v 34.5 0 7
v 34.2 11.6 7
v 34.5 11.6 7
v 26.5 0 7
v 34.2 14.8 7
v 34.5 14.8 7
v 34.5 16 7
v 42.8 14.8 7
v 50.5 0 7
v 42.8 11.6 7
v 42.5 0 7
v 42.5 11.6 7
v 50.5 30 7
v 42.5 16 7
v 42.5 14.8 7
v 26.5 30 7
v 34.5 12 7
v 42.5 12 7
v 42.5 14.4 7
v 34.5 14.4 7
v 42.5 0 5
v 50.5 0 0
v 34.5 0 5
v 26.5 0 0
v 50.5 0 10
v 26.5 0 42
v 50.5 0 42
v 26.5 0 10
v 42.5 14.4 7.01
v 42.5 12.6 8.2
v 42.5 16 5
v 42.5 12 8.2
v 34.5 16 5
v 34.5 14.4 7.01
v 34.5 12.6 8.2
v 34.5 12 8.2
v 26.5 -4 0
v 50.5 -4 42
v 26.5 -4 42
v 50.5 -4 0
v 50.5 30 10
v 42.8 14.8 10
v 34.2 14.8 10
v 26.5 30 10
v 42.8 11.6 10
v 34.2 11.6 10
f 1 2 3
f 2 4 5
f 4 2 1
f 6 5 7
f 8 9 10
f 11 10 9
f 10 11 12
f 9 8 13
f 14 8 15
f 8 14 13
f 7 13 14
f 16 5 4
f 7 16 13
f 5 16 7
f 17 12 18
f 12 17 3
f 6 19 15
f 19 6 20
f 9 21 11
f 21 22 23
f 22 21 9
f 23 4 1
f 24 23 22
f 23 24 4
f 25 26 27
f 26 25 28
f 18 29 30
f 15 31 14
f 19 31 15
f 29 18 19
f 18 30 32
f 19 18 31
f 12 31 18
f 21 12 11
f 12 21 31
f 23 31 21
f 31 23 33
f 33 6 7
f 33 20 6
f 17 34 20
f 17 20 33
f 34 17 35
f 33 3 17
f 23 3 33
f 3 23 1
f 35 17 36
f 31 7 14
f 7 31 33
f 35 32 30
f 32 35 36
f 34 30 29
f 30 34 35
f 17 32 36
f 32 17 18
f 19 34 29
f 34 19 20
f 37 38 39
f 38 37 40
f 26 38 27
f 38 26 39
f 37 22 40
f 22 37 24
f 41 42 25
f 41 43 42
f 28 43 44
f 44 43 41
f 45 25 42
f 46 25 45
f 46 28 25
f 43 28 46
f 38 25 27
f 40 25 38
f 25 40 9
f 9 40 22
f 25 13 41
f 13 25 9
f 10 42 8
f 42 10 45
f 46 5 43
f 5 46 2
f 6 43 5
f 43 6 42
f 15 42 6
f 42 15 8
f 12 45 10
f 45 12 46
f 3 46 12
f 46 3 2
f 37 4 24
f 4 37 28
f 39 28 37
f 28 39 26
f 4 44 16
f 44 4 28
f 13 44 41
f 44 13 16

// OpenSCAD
// Lab Rax generic equipment tray + faceplate (wizard template).
// Faceplate derived from the Pi4 baseline; rack holes follow the four-corner layout of the user-supplied
// 1U blank plate (faceplate_mounting.json): EVERY rack unit gets 4 holes, never a single centre pair.
// The wizard appends override assignments at the end of this file.
// PROPOSED, UNVALIDATED: printed fit, strength and rack clearance are UNKNOWN.
$fn=48;
part="assembly";            // assembly, faceplate, tray, combined, rear_bracket
// Device envelope (mm). Origin of hole coordinates = device front-left corner, seen from above.
dev_w=85; dev_d=56; dev_h=20;
holes=[];                   // [[x,y],...] mounting hole centres
hole_d=2.7;                 // device mounting hole diameter
device_mount="inserts";     // inserts, pegs, clips, straps
standoff=6;                 // device lift above tray floor
insert_pilot=3.2;           // pilot for heat-set insert (inserts mode)
board_t=1.6;                // board/flange thickness (pegs, clips)
joint="screw";              // screw, snap, single
u=1;                        // faceplate height in rack units
keystones=[];               // [x,...] keystone centres on faceplate (X=0 centre)
// Keystone v2 (2026-10-19): re-modelled from measurements of Brian's reference keystone frame
// (14.5 x 16 opening was too narrow when printed). Opening 14.8 x 16.6 through the plate, plus a rear collar
// 19.8 x 27.85 reaching 9.2 mm behind the front face (bottom lip to 10.4) that carries the latch ramp and catches.
ks_w=14.8; ks_h=16.6;       // front opening
ks_ow=19.8; ks_ob=11.9; ks_ot=15.95; ks_od=9.2; ks_lip=10.4;  // collar width, below/above opening centre, depth
ports=[];                   // [[x,z,w,h,r],...] faceplate cut-outs, z from plate bottom, r=corner radius
front_gap=12;               // device front to faceplate rear face
margin=8;                   // tray border around device
rear_support=false;         // heavy/deep equipment: tray runs to the rear posts and screws to a rear bracket
coupon=[];                  // test coupon: [x0,x1,ymax] keeps only that slice of the part

// 4 mm plate (owner default 2026-10-18). Corner radius is limited by the four-corner holes:
// the reference holes sit 1.6 mm from the top/bottom edge, so larger corners would cut into them.
plate_w=252; plate_t=4; plate_r=2.5; plate_h=u*44.45-2.45;
hole_x=118.2625; hole_dz=15.902;   // each U: holes at its centre ±hole_dz (5.098 / 36.902 on a 1U plate)
rack_depth=240;             // Lab Rax frame depth (front of front posts to back of rear posts)
nudge=0;                    // render-repair only: tiny size offset applied when OpenSCAD 2021 emits a sliver
tray_t=3; tray_z=7;
tray_w=dev_w+2*margin; tray_d=rear_support?rack_depth:dev_d+front_gap+margin;
tray_x=-tray_w/2; tray_y=0;
dev_x=-dev_w/2; dev_y=front_gap; floor_top=tray_z+tray_t;
jx=min(40,tray_w/2-12); joint_x=[-jx,jx];
tongue_w=12; tongue_depth=7; tongue_h=3; tongue_z=tray_z+3.5;
slot_clear=0.3; boss_d=9; m3_clear=3.4; joint_pilot=4.0;  // 4.0 = the printed, well-fitting Pi4 trial

module capsule2d(len=10,diam=7){hull(){translate([-(len-diam)/2,0])circle(d=diam);translate([(len-diam)/2,0])circle(d=diam);}}
module rrect(w,h,r){rr=min(r,w/2-0.01,h/2-0.01);if(rr<=0)square([w,h],center=true);else offset(r=rr)square([w-2*rr,h-2*rr],center=true);}
// Mirror front-of-tray features to the rear (about the rack's mid-depth).
module to_rear(){translate([0,rack_depth/2,0])mirror([0,1,0])translate([0,-rack_depth/2,0])children();}

// Faceplate outline seen from the front: 2D X = rack X, 2D Y = height Z.
// rear=true cuts the larger keystone pocket; plain=true leaves out keystones/ports (rear bracket).
module plate2d(rear=false,plain=false){
 difference(){
  hull()for(sx=[-1,1],sz=[-1,1])translate([sx*(plate_w/2-plate_r),plate_h/2+sz*(plate_h/2-plate_r)])circle(r=plate_r+nudge);
  for(i=[0:u-1],dz=[-hole_dz,hole_dz],x=[-hole_x,hole_x])translate([x,i*44.45+21+dz])capsule2d();
  if(!plain){
   for(p=ports)translate([p[0],p[1]])rrect(p[2],p[3],p[4]);
  }
 }
}
// Plate between y=y0 (front) and y0+t, built from the 2D outline (cleaner meshes than 3D cuts in OpenSCAD 2021).
module plate_layer(y0,t,rear=false,plain=false){translate([0,y0+t,0])rotate([90,0,0])linear_extrude(height=t)plate2d(rear,plain);}

module plate_joint_add(){
 if(joint=="screw"){
  for(x=joint_x)translate([x-tongue_w/2,0,tongue_z])cube([tongue_w,tongue_depth,tongue_h]);
  for(x=joint_x)translate([x,0,tray_z+14])rotate([-90,0,0])cylinder(d=boss_d,h=8);
 }
 if(joint=="snap") for(x=joint_x){
  // Cantilever arm under the tray floor; barb snaps up into a floor window.
  translate([x-4,0,tray_z-2])cube([8,16,2]);
  // Barb v2: square catch face toward the plate, ramp falling toward the rear so the tray, slid in
  // from the rear, cams the arm down until its window drops over the barb.
  translate([x-4,12,tray_z])hull(){cube([8,0.6,1.2]);cube([8,2.4,0.01]);}
 }
}
// Keystone collar behind the plate, and the jack-shaped cut through plate + collar.
// Profile in (d = depth behind front face, z from opening centre); X width is ks_w throughout.
module ks_collar(){for(x=keystones)translate([x-ks_ow/2,-plate_t,plate_h/2]){
 translate([0,0,-ks_ob])cube([ks_ow,ks_od,ks_ob+ks_ot]);
 translate([0,0,-ks_ob])cube([ks_ow,ks_lip,ks_ob-ks_h/2]);
}}
module ks_cut(){for(x=keystones)translate([x-ks_w/2,-plate_t,plate_h/2])rotate([90,0,90])linear_extrude(height=ks_w)
 polygon([[-1,-ks_h/2],[5.8,-ks_h/2],[5.8,-9.9],[9.2,-9.9],[9.2,-ks_h/2],[11,-ks_h/2],[11,11.6],[8.2,11.6],
          [8.2,ks_ot+1],[7.2,ks_ot+1],[7.2,13.6],[0.6,ks_h/2],[-1,ks_h/2]]);}
module plate_joint_cut(){if(joint=="screw")for(x=joint_x)translate([x,-0.1,tray_z+14])rotate([-90,0,0])cylinder(d=joint_pilot,h=8.2);}

module faceplate(){
 difference(){
  union(){
   plate_layer(-plate_t,plate_t);
   ks_collar();
   plate_joint_add();
  }
  plate_joint_cut();
  ks_cut();
 }
}
// Plain plate on the rear posts (mirror of the faceplate, no openings) that the tray's rear end screws/snaps to.
module rear_bracket(){to_rear()difference(){union(){plate_layer(-plate_t,plate_t,false,true);plate_joint_add();}plate_joint_cut();}}

module device_features_add(){
 if(device_mount=="inserts")for(h=holes)translate([dev_x+h[0],dev_y+h[1],floor_top])cylinder(d=max(insert_pilot+3.5,7),h=standoff);
 if(device_mount=="pegs")for(h=holes)translate([dev_x+h[0],dev_y+h[1],floor_top]){
  cylinder(d=hole_d+3,h=standoff);
  translate([0,0,standoff])cylinder(d=hole_d-0.3,h=board_t+0.8);
  translate([0,0,standoff+board_t+0.8])cylinder(d1=hole_d-0.3,d2=hole_d-1,h=0.8);
 }
 if(device_mount=="clips"){
  // Support ledges at the four corners plus a flexing clip on each side.
  for(x=[dev_x-1,dev_x+dev_w-5],y=[dev_y-1,dev_y+dev_d-5])translate([x,y,floor_top])cube([6,6,standoff]);
  for(s=[-1,1])translate([s>0?dev_x+dev_w+0.2:dev_x-2.2,dev_y+dev_d/2-5,floor_top]){
   cube([2,10,standoff+board_t+2.5]);
   translate([s>0?-1.2:2,0,standoff+board_t+0.2])hull(){cube([1.2,10,1.6]);translate([s>0?1.2:0,0,1.6])cube([0.01,10,0.6]);}
  }
 }
}
module device_features_cut(){
 if(device_mount=="inserts")for(h=holes)translate([dev_x+h[0],dev_y+h[1],floor_top+0.01])cylinder(d=insert_pilot,h=standoff+0.1);
 if(device_mount=="straps")for(x=[dev_x-5.5,dev_x+dev_w+2.5],y=[dev_y+dev_d*0.25,dev_y+dev_d*0.75])
  translate([x,y-6,tray_z-0.1])cube([3,12,tray_t+0.2]);
}

module tray_joint_add(){
 if(joint=="screw"){
  for(x=joint_x) translate([x-9,0,tray_z+tray_t])cube([18,8,5]);
  for(x=joint_x)translate([x-7,8.3,tray_z+3])cube([14,3,19]);
  for(x=joint_x) for(side=[-1,1]) translate([x+side*6-1,0,0])
    hull(){translate([0,9,tray_z+2.7])cube([2,2,0.5]);
           translate([0,9,tray_z+8])cube([2,2,0.5]);
           translate([0,20,tray_z+2.7])cube([2,2,0.5]);}
 }
}
module tray_joint_cut(){
 if(joint=="screw"){
  for(x=joint_x)translate([x-(tongue_w+slot_clear)/2,-0.1,tongue_z-slot_clear/2])cube([tongue_w+slot_clear,tongue_depth+slot_clear,tongue_h+slot_clear]);
  for(x=joint_x)translate([x,11.4,tray_z+14])rotate([90,0,0])cylinder(d=m3_clear,h=12);
 }
 if(joint=="snap")for(x=joint_x)translate([x-4.3,11.6,tray_z-0.1])cube([8.6,3.2,tray_t+0.2]);
}

module tray(){
 difference(){
  union(){
   translate([tray_x,tray_y,tray_z])cube([tray_w,tray_d,tray_t]);
   tray_joint_add();
   if(rear_support)to_rear()tray_joint_add();
   device_features_add();
  }
  tray_joint_cut();
  if(rear_support)to_rear()tray_joint_cut();
  device_features_cut();
 }
}

module clip_coupon(){if(len(coupon)==3)intersection(){children();translate([coupon[0],-50,-50])cube([coupon[1]-coupon[0],coupon[2]+50,400]);}else children();}

clip_coupon(){
 if(part=="faceplate")faceplate();
 else if(part=="tray")tray();
 else if(part=="rear_bracket")rear_bracket();
 else if(part=="combined")union(){faceplate();translate([tray_x,-0.01,tray_z])cube([tray_w,0.02+0.01,tray_t]);tray();if(rear_support)rear_bracket();}
 else {color("steelblue")faceplate();color("silver")tray();if(rear_support)color("steelblue")rear_bracket();
  %translate([dev_x,dev_y,floor_top+(device_mount=="inserts"||device_mount=="pegs"||device_mount=="clips"?standoff:0)])cube([dev_w,dev_d,dev_h]);}
}

// ---- wizard overrides: 2_Snap_joint
dev_w=85.0;
dev_d=56.0;
dev_h=20.0;
hole_d=2.7;
standoff=6.0;
insert_pilot=3.2;
board_t=1.6;
u=1;
holes=[[3.5, 3.5], [61.5, 3.5], [3.5, 52.5], [61.5, 52.5]];
keystones=[];
device_mount="inserts";
joint="snap";
rear_support=false;
coupon=[26.5, 50.5, 30.0];
ports=[];
